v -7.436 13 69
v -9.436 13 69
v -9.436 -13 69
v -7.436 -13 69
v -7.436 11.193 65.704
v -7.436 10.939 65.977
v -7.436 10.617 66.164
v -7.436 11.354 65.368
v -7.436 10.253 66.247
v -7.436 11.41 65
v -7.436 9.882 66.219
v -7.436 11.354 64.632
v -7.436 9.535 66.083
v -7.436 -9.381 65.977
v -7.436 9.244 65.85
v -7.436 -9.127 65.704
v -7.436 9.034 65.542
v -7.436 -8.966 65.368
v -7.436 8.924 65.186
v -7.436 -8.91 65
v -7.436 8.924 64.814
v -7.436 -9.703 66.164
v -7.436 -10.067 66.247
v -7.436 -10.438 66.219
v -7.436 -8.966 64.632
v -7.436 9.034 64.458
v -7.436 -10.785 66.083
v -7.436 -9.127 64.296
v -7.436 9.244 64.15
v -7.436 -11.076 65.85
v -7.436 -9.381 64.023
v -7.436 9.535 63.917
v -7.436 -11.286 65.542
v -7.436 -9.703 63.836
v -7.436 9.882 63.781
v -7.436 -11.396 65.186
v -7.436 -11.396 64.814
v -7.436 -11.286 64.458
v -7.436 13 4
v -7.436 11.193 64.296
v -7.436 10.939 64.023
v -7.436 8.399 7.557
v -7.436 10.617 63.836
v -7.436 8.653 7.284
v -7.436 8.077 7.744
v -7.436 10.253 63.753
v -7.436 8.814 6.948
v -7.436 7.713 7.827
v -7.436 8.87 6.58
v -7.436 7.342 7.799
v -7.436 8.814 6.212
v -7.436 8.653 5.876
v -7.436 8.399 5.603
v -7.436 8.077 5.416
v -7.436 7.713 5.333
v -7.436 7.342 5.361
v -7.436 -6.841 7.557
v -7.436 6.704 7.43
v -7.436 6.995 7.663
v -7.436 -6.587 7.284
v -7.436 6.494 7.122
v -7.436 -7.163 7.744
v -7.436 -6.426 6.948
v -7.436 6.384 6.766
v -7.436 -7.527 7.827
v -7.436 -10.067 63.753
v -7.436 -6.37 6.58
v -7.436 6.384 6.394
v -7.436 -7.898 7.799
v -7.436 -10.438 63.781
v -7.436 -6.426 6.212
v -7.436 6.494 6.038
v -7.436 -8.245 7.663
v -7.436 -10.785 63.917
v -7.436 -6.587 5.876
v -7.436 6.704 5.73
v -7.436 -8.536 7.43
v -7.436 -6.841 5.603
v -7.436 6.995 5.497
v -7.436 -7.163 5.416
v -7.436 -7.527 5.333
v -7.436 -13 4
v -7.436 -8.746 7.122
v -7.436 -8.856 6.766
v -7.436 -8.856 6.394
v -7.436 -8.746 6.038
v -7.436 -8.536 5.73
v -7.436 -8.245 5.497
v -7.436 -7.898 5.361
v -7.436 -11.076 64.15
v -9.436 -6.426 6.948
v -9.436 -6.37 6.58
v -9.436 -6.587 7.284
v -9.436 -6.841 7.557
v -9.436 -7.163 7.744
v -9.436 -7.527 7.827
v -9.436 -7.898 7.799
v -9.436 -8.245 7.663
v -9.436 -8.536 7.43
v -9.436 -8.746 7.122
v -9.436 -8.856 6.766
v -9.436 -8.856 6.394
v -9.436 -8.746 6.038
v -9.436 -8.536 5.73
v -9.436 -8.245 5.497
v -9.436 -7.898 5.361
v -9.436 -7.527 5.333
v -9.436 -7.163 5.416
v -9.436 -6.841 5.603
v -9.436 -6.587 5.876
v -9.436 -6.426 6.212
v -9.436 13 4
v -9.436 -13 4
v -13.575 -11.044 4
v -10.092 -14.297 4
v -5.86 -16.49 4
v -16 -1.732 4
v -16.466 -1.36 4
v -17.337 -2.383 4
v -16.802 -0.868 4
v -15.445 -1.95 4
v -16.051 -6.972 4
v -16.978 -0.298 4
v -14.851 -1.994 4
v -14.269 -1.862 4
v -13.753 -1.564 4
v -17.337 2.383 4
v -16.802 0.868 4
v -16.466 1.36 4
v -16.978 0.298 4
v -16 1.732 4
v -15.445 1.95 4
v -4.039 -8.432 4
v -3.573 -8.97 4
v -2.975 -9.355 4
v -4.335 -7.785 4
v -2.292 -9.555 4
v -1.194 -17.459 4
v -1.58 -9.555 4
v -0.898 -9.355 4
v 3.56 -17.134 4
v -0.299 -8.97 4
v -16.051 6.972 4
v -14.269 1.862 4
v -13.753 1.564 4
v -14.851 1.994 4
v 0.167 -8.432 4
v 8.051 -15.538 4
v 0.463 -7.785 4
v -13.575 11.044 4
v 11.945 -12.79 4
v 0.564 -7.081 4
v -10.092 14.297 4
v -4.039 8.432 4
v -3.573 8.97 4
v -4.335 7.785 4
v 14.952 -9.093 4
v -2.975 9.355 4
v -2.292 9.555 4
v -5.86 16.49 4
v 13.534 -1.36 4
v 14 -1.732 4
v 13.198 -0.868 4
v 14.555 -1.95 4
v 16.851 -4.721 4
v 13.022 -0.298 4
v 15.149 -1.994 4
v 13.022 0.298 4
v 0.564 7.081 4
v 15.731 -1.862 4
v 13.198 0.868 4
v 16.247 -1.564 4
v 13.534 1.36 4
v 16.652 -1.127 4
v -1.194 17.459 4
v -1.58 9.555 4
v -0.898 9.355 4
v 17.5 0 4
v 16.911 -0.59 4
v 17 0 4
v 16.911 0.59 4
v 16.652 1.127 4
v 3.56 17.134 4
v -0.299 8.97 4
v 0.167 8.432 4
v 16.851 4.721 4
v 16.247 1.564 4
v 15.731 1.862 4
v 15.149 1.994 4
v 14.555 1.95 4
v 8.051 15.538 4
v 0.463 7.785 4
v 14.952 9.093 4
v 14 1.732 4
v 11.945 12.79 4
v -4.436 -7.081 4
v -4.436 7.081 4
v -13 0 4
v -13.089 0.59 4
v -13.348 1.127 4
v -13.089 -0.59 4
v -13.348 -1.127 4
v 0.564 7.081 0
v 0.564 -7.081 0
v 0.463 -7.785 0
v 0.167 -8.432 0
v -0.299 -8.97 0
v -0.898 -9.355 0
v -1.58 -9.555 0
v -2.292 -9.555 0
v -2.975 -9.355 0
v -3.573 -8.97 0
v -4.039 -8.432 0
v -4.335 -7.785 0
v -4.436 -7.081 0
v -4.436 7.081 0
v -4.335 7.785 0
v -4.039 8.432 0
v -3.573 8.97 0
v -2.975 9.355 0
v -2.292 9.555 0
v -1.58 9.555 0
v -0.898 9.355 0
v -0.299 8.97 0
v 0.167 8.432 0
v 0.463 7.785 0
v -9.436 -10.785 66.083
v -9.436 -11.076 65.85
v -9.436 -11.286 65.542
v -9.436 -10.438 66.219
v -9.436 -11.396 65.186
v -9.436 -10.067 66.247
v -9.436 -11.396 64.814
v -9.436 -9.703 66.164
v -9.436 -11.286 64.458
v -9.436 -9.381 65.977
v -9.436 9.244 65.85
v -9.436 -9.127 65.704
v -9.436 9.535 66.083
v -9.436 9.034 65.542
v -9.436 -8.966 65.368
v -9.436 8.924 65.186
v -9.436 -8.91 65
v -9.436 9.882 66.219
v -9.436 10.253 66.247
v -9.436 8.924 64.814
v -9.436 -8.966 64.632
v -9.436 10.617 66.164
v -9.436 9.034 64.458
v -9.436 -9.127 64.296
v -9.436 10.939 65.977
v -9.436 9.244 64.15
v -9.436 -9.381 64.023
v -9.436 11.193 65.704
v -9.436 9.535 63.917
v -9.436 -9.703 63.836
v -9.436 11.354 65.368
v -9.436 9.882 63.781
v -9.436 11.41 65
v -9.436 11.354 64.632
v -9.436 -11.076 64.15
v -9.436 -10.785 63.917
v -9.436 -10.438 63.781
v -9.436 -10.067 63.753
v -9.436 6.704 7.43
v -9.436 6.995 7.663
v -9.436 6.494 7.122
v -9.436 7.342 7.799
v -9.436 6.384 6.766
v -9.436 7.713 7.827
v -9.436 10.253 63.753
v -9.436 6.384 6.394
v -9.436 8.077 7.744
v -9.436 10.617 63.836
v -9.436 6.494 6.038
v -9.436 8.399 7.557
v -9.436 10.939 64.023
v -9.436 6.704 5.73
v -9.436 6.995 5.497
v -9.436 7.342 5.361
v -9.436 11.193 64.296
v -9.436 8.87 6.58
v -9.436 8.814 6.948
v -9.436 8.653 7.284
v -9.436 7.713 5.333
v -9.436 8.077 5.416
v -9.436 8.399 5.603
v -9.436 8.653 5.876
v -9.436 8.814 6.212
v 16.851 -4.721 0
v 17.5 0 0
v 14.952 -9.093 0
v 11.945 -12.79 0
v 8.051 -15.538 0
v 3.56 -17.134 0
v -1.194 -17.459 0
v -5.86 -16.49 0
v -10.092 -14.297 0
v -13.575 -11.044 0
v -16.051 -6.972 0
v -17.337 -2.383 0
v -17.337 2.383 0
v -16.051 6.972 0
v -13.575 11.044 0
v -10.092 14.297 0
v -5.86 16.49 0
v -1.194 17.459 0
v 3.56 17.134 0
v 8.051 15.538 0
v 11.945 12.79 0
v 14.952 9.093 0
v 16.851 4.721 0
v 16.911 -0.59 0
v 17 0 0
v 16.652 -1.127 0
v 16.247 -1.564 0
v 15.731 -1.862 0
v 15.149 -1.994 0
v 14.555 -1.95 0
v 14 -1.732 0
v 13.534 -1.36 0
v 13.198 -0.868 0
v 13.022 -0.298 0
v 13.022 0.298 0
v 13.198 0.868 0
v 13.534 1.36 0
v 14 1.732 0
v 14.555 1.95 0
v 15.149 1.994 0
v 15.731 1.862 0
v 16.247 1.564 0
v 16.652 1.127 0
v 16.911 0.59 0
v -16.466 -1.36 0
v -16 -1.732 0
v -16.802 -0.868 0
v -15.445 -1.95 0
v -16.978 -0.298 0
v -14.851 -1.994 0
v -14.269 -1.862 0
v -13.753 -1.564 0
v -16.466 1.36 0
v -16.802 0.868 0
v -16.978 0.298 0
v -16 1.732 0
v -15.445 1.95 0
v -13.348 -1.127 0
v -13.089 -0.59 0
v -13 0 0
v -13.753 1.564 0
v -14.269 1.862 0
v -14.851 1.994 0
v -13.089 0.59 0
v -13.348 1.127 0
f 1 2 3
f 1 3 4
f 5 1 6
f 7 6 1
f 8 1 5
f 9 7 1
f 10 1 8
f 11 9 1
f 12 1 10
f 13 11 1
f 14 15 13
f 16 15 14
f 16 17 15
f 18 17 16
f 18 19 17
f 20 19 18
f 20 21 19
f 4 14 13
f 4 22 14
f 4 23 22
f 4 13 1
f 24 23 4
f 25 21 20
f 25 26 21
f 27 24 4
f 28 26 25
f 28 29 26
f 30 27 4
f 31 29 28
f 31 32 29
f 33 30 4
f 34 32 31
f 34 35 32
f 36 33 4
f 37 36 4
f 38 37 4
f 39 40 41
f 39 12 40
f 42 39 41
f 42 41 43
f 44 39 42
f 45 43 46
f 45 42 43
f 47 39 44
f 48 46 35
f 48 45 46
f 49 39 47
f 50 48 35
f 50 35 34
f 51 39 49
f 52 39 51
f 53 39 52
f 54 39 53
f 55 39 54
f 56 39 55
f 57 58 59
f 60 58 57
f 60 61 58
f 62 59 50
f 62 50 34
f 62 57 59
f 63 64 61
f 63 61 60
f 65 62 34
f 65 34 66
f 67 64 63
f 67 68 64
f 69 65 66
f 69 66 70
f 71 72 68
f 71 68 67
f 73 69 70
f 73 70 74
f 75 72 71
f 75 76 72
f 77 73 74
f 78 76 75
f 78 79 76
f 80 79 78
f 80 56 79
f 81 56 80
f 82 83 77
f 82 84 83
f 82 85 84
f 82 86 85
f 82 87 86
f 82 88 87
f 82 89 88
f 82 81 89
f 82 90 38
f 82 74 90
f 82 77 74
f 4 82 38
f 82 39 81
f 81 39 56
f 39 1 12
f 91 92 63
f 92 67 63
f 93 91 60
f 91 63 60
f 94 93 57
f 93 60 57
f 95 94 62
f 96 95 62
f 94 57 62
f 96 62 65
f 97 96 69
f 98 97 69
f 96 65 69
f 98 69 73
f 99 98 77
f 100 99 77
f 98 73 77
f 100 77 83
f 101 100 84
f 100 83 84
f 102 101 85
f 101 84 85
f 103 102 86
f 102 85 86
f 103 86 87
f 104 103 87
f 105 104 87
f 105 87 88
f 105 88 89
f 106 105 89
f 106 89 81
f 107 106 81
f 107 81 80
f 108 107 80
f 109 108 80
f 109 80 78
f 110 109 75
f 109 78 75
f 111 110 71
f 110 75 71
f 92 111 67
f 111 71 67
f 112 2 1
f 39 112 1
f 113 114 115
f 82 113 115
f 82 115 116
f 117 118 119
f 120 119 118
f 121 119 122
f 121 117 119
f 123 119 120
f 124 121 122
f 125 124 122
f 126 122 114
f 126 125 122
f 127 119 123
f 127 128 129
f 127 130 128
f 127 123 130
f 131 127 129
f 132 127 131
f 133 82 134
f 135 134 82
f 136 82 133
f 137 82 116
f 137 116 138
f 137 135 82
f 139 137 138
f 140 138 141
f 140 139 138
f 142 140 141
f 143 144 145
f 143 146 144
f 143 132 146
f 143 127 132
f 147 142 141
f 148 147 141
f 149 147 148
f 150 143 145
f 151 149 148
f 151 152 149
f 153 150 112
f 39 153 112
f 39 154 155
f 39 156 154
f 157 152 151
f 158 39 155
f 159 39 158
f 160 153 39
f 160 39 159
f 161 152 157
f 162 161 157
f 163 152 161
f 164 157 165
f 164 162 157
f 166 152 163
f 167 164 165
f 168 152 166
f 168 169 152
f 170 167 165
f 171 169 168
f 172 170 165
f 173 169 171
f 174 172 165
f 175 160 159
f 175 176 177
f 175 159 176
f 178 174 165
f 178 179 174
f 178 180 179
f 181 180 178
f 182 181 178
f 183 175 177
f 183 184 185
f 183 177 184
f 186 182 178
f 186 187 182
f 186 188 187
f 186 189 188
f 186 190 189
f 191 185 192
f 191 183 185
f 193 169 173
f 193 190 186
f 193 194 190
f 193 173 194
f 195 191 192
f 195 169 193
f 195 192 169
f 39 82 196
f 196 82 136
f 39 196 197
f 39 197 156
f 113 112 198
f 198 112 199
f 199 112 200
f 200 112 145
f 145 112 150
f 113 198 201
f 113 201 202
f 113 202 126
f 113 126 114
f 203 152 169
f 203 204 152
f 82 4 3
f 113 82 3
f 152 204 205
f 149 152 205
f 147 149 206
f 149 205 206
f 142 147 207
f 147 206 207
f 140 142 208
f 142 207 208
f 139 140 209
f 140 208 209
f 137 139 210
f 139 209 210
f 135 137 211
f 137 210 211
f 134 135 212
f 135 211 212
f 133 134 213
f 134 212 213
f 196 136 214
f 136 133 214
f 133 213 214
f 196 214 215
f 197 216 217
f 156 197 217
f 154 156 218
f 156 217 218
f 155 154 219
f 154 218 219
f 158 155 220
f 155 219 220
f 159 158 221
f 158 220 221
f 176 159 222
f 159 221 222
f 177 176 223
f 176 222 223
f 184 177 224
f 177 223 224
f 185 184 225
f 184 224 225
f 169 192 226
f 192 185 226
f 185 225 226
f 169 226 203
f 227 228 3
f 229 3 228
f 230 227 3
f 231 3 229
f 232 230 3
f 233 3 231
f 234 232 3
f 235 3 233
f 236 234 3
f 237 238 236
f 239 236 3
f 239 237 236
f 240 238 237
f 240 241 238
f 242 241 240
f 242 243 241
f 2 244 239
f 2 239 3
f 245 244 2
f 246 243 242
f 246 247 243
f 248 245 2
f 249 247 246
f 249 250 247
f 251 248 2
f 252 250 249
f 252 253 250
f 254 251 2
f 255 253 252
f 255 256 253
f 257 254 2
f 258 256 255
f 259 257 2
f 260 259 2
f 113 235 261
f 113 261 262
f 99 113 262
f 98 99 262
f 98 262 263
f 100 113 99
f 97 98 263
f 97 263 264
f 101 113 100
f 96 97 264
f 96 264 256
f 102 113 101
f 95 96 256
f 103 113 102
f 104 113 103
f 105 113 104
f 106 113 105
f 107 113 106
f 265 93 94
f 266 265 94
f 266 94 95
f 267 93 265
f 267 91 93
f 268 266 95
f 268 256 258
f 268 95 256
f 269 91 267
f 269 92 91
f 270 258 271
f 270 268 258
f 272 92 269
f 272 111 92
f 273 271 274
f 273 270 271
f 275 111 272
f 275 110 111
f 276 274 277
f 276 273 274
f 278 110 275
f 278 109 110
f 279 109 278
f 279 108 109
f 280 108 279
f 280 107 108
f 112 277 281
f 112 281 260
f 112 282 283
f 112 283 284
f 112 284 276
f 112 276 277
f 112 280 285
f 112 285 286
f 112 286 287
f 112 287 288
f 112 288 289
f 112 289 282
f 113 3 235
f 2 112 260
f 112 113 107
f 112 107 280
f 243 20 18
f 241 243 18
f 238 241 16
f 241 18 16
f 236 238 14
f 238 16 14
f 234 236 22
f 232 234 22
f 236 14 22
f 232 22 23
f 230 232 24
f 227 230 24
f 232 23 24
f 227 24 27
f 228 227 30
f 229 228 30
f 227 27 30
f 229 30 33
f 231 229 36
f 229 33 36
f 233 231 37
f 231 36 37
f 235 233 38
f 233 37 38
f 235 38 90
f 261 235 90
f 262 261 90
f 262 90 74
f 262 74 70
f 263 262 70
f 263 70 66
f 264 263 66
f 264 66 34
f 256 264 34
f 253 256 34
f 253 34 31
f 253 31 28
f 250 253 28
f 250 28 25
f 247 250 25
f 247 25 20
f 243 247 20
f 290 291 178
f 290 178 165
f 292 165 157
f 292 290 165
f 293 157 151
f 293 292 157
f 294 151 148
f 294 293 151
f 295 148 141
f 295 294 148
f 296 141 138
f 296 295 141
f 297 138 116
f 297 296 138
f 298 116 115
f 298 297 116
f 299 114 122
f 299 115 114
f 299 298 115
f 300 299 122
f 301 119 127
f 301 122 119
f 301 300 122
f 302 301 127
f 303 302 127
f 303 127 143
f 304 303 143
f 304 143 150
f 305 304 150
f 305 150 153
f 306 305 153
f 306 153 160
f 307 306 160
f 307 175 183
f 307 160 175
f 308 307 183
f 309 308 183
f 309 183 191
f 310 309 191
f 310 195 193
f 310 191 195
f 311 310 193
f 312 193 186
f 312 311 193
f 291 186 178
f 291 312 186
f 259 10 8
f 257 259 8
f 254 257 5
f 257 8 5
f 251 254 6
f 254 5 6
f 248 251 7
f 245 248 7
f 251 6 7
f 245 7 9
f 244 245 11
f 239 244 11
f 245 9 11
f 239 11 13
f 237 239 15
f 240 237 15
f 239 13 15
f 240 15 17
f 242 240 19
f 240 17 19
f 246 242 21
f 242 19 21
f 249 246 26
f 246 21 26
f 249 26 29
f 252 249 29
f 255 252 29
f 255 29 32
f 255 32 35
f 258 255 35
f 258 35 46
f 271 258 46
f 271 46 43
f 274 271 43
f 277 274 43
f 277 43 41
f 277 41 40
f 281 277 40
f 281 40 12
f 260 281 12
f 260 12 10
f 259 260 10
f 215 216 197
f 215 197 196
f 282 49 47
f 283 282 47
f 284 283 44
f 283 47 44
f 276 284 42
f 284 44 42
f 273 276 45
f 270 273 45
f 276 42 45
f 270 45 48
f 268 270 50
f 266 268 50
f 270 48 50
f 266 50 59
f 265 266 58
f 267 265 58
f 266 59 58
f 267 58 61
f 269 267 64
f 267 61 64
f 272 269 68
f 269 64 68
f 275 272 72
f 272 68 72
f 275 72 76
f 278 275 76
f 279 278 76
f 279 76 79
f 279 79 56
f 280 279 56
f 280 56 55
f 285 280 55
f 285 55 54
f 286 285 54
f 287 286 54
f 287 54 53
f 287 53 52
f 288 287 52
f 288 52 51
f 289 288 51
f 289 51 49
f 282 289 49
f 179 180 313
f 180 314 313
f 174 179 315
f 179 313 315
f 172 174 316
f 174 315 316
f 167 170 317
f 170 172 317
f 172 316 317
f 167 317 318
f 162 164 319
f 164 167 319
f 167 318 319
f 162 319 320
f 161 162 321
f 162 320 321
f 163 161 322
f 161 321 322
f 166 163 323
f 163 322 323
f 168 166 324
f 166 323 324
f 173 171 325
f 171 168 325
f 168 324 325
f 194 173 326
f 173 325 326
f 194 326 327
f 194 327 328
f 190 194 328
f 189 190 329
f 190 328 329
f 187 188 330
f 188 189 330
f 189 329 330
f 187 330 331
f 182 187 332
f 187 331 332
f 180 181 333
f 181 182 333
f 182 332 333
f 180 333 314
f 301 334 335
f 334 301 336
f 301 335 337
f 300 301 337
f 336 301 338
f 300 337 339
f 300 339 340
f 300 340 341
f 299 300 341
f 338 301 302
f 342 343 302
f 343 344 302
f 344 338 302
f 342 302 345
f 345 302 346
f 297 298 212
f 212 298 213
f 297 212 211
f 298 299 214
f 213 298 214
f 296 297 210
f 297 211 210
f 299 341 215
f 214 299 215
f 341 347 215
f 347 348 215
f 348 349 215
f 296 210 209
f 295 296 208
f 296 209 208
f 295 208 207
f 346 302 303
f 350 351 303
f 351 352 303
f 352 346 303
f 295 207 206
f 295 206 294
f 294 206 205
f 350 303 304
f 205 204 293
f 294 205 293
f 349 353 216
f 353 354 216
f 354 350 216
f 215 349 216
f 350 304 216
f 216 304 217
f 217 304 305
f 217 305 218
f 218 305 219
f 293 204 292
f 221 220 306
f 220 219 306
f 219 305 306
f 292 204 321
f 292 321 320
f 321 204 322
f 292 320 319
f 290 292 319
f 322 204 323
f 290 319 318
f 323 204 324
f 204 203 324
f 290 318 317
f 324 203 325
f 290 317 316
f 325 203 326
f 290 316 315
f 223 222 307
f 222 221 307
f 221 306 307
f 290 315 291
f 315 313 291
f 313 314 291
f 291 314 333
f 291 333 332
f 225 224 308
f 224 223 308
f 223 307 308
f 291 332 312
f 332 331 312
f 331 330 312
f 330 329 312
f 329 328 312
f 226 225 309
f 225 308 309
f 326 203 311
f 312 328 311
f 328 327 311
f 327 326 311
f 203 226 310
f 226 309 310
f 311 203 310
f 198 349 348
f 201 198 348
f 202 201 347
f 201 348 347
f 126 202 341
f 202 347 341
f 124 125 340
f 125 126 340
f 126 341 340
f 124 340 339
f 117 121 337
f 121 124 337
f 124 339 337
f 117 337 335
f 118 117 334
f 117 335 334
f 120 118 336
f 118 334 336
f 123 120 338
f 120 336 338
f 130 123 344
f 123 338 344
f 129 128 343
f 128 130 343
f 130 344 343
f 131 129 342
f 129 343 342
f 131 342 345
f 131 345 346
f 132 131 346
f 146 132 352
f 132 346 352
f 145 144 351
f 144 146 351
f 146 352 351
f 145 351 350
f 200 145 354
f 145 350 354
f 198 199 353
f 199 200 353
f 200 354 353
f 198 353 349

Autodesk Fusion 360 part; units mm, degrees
sketch "Base" plane through (0, 0, 0) normal (0, 0, 1) x (1, 0, 0)
  circle A0 centre (0, 0) radius 17.5
  circle A1 centre (-15, 0) radius 2
  circle A2 centre (15, 0) radius 2
  line L0 (0.5638, -7.0807) -> (0.5638, 7.0807)
  arc A3 (0.5638, 7.0807) -> (-4.4362, 7.0807) centre (-1.9362, 7.0807) ccw
  line L1 (-4.4362, 7.0807) -> (-4.4362, -7.0807)
  arc A4 (-4.4362, -7.0807) -> (0.5638, -7.0807) centre (-1.9362, -7.0807) ccw
  line L2 (-1.9362, -7.0807) -> (-1.9362, 7.0807) construction
  point P0 (-1.9362, 0)
  dimension "d1" = 35
  dimension "d2" = 4
  dimension "d3" = 4
  dimension "d4" = 15
  dimension "d5" = 15
  dimension "d6" = 5
extrude "Extrude1" add sketch "Base" along normal blind 4
sketch "Board Bed" plane through (0, 0, 4) normal (0, 0, 1) x (1, 0, 0)
  line L0 (-9.4362, 13) -> (-7.4362, 13)
  line L1 (-7.4362, 13) -> (-7.4362, -13)
  line L2 (-7.4362, -13) -> (-9.4362, -13)
  line L3 (-9.4362, -13) -> (-9.4362, 13)
  circle A0 centre (-15, 0) radius 2
  arc A1 (-4.4362, -7.0807) -> (0.5638, -7.0807) centre (-1.9362, -7.0807) ccw
  line L4 (-4.4362, -7.0807) -> (-4.4362, 7.0807)
  arc A2 (0.5638, 7.0807) -> (-4.4362, 7.0807) centre (-1.9362, 7.0807) ccw
  line L5 (0.5638, 7.0807) -> (0.5638, -7.0807)
  circle A3 centre (15, 0) radius 2
  circle A4 centre (0, 0) radius 17.5
  dimension "d9" = 26
  dimension "d10" = 13
  dimension "d13" = 3
extrude "Extrude2" add sketch "Board Bed" along normal blind 65 contours L0 L1 L2 L3
sketch "Sketch4" plane through (-7.4362, 0, 0) normal (1, 0, 0) x (0, 1, 0)
  line L0 (-13, 4) -> (13, 4)
  line L1 (13, 4) -> (13, 69)
  line L2 (13, 69) -> (-13, 69)
  line L3 (-13, 69) -> (-13, 4)
  circle A0 centre (7.62, 6.58) radius 1.25
  circle A1 centre (-7.62, 6.58) radius 1.25
  circle A2 centre (-10.16, 65) radius 1.25
  circle A3 centre (10.16, 65) radius 1.25
  dimension "d14" = 2.5
  dimension "d15" = 2.5
  dimension "d16" = 15.24
  dimension "d17" = 7.62
  dimension "d18" = 2.5
  dimension "d19" = 2.5
  dimension "d20" = 10.16
  dimension "d21" = 10.16
  dimension "d22" = 20.32
  dimension "d25" = 58.42
  dimension "d26" = 58.42
  dimension "d28" = 2.58
  dimension "d29" = 2.58
extrude "Extrude3" cut sketch "Sketch4" against normal blind 5 contours A0 | A1 | A2 | A3
